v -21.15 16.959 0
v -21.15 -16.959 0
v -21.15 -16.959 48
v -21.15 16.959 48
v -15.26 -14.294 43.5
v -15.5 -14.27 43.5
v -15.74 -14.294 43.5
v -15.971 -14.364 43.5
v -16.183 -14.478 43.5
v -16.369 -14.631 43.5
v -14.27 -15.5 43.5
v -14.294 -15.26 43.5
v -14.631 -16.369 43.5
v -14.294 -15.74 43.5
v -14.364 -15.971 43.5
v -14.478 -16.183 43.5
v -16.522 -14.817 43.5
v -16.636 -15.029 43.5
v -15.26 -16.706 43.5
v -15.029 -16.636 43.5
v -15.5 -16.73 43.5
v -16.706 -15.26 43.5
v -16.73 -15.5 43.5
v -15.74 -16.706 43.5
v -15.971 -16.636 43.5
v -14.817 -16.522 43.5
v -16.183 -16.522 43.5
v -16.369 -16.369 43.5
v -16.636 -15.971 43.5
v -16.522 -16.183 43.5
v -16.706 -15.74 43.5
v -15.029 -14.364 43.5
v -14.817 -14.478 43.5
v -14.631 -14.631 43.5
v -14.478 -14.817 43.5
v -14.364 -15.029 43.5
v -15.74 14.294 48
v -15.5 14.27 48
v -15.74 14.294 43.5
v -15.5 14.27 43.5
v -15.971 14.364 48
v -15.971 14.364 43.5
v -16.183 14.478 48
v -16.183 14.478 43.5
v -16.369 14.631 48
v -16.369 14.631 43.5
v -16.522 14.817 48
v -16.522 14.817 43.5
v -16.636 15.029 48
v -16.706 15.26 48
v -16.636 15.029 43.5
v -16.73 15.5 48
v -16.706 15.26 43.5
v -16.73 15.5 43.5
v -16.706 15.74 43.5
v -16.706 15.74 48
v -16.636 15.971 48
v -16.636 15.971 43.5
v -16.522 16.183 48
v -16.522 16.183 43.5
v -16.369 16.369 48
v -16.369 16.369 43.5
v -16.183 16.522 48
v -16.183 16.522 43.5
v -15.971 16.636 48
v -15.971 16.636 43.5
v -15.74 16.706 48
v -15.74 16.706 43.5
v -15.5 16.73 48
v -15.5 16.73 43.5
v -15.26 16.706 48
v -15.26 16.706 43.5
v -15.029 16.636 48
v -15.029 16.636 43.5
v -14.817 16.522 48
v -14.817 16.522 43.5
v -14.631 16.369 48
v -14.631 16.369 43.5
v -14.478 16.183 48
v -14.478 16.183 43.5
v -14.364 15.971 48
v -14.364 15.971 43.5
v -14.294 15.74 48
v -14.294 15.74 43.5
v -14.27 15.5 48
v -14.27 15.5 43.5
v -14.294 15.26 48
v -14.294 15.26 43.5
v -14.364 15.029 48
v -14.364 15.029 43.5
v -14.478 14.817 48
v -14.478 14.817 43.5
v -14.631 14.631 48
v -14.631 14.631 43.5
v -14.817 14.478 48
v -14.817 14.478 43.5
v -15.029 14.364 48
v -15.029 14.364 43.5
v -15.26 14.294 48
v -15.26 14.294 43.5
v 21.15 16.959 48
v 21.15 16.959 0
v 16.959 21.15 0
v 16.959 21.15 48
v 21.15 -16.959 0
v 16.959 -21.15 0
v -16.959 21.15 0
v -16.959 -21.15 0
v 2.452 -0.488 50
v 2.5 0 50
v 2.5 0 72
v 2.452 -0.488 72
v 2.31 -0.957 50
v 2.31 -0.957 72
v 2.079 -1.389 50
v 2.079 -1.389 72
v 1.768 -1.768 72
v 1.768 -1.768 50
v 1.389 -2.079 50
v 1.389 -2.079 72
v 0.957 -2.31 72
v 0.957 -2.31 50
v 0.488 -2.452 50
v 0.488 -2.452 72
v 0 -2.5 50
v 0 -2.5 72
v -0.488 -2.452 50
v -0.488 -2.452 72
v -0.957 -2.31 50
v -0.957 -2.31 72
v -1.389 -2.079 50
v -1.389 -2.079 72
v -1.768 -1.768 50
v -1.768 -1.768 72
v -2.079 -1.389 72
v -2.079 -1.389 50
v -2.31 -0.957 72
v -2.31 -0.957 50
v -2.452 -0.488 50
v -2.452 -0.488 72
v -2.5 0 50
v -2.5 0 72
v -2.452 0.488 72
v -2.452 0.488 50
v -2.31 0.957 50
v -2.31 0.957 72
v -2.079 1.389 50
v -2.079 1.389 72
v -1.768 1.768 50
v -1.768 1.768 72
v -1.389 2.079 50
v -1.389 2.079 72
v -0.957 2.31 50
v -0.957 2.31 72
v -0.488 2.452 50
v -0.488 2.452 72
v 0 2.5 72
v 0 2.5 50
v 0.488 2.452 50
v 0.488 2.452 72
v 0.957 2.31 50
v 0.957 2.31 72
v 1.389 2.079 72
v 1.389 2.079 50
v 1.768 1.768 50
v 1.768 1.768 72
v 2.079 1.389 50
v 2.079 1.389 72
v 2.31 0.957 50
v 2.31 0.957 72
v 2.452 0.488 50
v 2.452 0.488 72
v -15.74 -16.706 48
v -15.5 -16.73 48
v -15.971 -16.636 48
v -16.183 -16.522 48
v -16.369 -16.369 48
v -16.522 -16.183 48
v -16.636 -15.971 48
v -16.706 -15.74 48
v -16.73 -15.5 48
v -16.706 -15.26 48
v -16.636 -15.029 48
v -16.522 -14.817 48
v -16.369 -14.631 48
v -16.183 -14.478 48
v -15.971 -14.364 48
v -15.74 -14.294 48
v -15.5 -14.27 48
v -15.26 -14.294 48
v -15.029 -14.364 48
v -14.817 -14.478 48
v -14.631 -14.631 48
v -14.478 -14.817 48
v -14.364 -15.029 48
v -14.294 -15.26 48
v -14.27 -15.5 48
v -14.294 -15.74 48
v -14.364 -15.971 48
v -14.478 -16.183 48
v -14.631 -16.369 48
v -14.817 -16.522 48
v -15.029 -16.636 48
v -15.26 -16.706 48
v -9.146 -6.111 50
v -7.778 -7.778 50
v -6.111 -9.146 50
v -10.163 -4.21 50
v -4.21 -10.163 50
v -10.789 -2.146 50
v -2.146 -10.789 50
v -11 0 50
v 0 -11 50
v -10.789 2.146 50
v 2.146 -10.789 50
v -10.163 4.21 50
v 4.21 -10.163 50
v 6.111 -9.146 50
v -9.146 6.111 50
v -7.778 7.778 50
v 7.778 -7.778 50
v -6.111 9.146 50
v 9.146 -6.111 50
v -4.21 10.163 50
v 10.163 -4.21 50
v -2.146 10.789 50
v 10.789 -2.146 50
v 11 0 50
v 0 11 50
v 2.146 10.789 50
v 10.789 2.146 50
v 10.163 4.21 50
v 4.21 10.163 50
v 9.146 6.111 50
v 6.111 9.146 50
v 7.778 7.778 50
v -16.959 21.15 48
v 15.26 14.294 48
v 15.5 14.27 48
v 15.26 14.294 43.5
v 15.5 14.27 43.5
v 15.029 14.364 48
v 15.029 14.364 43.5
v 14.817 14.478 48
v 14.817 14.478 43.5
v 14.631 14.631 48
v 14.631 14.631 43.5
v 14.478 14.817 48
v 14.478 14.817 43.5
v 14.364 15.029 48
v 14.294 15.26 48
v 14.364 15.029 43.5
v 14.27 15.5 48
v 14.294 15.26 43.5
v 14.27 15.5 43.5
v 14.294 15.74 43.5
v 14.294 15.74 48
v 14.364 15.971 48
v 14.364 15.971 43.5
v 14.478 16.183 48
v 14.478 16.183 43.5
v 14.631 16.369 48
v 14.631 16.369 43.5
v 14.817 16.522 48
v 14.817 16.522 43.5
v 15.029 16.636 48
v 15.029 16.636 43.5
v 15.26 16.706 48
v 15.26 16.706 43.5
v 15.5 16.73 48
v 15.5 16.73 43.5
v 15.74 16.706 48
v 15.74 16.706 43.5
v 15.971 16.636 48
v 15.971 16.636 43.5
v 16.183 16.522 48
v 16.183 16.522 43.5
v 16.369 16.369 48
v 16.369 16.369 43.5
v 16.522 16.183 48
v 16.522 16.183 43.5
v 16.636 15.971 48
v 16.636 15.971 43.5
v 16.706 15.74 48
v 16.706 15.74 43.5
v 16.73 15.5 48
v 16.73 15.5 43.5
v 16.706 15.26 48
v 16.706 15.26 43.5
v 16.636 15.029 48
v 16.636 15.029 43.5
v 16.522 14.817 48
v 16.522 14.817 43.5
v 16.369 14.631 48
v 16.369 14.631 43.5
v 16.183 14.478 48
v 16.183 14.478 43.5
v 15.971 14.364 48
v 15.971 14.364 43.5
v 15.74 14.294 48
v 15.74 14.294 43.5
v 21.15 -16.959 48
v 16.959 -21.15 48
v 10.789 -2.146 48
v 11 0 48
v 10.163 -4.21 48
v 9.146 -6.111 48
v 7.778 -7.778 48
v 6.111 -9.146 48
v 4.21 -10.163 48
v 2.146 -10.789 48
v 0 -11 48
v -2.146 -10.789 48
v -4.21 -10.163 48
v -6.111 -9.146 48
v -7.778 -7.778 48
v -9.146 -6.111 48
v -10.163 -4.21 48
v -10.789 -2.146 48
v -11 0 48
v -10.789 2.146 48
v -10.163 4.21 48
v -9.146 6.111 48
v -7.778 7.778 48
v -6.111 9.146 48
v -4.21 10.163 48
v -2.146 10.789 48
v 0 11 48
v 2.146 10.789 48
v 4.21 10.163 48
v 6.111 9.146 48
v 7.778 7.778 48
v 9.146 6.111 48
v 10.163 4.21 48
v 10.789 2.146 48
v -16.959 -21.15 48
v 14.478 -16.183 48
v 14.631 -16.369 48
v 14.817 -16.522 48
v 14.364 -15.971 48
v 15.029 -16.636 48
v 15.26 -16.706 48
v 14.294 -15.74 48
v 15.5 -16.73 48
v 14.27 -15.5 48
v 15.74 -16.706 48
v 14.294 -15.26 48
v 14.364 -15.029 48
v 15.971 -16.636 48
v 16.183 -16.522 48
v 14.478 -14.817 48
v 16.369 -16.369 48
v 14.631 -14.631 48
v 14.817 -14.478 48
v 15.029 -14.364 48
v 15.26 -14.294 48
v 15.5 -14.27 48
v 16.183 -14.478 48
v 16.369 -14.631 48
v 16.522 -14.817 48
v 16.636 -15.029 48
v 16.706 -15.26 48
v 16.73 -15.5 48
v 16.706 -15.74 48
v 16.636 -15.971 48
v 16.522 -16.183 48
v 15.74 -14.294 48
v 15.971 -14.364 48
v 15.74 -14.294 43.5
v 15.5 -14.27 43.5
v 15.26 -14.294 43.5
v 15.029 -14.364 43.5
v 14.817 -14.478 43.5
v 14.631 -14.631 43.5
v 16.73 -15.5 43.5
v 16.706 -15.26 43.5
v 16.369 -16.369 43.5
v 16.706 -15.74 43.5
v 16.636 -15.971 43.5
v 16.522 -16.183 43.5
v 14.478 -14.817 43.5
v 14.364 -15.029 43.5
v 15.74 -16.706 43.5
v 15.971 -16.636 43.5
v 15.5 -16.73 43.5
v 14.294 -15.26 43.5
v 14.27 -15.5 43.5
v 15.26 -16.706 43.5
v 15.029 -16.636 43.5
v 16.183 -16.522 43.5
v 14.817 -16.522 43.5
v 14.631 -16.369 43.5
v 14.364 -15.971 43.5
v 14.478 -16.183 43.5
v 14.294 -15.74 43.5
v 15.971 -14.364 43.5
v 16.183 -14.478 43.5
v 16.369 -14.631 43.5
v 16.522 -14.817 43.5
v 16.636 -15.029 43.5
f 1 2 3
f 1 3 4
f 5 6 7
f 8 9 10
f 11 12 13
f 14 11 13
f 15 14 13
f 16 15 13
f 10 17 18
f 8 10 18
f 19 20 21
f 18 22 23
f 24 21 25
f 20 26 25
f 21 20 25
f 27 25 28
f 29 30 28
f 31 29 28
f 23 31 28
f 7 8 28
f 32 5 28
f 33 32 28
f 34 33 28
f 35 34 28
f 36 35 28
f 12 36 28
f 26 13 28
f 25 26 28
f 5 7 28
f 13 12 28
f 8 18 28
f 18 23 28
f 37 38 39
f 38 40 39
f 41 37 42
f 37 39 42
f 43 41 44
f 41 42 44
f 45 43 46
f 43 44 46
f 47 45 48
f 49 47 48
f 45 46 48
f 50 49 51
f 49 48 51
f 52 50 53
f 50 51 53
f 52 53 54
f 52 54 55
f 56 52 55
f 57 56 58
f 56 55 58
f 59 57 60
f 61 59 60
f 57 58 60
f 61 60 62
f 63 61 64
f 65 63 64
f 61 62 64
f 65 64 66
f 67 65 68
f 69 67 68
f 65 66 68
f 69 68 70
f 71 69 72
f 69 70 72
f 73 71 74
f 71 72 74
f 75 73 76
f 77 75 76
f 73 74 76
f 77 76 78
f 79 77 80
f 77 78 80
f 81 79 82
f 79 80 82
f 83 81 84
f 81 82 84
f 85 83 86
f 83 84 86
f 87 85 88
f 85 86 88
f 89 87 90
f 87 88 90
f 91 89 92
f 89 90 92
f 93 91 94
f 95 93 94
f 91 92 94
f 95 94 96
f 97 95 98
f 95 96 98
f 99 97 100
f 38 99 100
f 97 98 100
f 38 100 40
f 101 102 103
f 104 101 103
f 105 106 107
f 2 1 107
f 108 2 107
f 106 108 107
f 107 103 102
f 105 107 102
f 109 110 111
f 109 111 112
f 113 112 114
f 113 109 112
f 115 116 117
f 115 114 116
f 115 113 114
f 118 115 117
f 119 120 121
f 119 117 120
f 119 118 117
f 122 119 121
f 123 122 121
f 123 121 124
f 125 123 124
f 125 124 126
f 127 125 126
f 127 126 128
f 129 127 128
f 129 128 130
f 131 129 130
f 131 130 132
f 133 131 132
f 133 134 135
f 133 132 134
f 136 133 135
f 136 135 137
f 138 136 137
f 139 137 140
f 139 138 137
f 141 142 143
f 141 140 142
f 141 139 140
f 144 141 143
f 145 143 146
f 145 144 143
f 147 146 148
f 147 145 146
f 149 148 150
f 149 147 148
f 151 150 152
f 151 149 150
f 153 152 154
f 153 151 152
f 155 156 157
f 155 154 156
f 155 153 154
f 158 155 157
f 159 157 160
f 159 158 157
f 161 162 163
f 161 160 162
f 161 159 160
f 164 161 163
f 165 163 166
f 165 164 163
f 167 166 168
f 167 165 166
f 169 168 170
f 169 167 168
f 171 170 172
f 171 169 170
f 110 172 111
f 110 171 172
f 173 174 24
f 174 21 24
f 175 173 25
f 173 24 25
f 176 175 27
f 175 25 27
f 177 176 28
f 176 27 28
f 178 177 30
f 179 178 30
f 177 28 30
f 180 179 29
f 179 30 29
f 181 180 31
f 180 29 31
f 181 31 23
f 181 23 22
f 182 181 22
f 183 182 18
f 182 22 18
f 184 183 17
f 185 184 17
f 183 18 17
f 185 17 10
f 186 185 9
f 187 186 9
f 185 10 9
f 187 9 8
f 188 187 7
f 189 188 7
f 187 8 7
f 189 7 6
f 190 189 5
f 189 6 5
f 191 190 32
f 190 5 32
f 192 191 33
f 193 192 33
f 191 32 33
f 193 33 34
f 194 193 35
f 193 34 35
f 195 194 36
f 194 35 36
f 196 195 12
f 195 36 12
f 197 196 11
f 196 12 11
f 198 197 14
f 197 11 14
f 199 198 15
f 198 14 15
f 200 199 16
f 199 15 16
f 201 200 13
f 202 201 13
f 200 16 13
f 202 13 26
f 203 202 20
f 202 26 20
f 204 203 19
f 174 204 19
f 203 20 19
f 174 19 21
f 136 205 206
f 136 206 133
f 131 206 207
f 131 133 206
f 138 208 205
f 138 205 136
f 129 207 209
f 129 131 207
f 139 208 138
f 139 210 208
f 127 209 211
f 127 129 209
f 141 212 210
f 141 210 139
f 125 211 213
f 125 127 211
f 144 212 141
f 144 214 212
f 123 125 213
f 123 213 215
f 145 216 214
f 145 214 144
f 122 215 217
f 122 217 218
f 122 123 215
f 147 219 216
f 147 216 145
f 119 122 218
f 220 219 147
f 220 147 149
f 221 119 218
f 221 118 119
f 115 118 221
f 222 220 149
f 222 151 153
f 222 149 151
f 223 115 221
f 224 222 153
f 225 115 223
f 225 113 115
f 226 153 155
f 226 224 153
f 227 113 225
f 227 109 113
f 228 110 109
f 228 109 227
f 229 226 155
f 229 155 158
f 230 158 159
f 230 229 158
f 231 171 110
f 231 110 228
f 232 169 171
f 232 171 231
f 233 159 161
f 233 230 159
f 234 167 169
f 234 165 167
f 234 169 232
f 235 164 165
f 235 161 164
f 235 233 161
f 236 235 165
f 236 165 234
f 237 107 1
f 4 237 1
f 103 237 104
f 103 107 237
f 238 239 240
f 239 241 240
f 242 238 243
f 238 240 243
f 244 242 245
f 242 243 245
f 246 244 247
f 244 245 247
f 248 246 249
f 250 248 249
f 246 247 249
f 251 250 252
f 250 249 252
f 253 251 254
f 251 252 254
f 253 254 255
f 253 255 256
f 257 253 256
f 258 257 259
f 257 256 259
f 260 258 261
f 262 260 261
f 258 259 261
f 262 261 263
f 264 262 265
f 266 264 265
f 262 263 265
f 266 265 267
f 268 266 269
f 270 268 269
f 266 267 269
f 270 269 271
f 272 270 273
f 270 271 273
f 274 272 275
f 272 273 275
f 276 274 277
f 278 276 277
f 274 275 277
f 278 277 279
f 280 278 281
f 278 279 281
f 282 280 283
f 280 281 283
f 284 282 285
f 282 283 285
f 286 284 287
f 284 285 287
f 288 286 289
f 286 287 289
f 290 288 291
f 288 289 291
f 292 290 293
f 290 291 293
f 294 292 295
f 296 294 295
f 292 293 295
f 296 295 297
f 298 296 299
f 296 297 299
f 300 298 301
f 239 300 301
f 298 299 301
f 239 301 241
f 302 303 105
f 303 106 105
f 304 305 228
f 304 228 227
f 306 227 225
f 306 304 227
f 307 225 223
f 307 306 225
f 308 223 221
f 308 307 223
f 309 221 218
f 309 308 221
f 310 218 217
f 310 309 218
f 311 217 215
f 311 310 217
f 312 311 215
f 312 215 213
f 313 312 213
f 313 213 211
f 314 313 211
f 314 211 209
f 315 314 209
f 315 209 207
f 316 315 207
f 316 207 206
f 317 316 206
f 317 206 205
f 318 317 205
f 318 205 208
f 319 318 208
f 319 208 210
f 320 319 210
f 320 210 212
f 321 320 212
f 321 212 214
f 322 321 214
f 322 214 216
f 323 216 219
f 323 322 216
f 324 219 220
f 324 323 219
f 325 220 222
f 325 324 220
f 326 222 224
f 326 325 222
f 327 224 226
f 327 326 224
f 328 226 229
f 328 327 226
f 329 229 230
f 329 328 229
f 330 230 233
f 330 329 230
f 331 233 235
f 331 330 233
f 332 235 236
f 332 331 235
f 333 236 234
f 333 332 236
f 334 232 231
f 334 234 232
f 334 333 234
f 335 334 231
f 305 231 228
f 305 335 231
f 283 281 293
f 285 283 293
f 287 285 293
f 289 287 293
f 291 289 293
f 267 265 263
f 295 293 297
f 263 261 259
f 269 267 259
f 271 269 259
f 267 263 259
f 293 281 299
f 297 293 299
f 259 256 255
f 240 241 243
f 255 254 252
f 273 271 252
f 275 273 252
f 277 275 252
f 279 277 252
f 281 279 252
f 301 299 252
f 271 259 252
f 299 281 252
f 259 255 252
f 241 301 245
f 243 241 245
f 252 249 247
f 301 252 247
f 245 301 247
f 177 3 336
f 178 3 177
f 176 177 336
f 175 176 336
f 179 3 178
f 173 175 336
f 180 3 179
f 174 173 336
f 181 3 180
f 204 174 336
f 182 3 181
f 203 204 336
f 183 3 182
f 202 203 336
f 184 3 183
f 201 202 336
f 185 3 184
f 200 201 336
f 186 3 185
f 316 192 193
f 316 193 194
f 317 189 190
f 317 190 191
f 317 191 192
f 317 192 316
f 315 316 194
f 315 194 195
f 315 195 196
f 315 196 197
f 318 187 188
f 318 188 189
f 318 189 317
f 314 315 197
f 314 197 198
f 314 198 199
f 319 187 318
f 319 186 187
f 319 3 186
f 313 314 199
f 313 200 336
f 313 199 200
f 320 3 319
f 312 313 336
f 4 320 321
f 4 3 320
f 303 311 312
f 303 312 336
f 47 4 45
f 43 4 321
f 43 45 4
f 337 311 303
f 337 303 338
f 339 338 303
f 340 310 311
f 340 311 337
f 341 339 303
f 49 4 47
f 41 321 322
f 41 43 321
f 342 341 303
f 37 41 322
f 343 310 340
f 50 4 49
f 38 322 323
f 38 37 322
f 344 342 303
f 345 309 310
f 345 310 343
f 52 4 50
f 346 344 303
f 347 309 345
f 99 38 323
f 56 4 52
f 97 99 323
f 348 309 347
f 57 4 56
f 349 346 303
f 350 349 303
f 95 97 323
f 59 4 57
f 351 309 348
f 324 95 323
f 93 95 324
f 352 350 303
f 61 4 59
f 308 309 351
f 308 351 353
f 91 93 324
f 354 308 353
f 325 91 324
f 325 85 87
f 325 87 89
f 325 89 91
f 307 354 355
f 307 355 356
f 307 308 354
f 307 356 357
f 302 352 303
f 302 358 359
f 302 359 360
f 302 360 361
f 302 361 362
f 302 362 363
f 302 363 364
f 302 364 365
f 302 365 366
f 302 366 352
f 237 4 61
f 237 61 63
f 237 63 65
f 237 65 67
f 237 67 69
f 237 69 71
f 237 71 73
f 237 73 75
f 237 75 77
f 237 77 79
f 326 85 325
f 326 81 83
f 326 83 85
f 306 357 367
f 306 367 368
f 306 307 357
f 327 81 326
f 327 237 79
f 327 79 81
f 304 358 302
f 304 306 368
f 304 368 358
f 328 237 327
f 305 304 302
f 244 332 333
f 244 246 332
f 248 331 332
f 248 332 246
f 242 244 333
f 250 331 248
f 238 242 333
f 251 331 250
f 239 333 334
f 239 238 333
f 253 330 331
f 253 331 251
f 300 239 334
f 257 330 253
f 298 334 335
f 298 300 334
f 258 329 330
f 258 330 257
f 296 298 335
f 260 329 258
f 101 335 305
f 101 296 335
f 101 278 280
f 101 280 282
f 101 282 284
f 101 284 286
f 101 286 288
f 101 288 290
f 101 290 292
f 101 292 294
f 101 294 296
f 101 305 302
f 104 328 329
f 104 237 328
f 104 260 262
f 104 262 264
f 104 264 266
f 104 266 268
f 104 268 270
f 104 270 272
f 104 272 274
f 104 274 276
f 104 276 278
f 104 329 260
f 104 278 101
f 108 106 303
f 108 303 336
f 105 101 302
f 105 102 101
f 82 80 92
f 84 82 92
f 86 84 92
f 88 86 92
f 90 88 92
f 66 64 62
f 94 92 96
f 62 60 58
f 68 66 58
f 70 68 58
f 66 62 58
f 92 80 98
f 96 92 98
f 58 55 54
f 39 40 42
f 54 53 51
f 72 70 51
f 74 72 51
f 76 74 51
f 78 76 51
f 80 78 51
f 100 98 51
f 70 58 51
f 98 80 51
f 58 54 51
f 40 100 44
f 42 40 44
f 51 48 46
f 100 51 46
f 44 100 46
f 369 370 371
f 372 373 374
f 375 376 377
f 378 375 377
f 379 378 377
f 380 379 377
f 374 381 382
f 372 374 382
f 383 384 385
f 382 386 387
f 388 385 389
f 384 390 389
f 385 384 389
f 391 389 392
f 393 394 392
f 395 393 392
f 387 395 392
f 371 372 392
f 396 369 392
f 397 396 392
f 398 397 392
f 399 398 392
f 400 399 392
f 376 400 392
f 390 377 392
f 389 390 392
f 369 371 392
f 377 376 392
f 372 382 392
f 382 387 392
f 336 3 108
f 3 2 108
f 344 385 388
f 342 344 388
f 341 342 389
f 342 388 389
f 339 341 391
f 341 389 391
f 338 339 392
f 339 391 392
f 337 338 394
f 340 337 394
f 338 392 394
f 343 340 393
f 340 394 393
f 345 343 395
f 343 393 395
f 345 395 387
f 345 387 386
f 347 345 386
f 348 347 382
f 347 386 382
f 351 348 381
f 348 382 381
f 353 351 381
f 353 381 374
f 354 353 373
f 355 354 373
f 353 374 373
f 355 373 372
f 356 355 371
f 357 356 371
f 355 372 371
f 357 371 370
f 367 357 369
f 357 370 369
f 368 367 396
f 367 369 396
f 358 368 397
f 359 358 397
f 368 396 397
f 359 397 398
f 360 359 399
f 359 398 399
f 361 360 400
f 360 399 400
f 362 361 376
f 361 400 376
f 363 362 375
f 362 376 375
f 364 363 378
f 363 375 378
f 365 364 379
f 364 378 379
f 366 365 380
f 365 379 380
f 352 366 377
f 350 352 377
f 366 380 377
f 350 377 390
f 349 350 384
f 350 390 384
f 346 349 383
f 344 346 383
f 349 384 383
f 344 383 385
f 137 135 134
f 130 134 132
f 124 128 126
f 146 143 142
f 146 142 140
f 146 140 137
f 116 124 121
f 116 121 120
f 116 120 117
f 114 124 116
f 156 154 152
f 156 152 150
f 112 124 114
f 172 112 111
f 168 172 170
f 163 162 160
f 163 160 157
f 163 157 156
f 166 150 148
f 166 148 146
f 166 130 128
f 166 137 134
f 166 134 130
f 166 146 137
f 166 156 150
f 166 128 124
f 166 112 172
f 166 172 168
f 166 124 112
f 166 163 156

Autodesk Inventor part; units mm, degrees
ref_plane "YZ Plane" through (0, 0, 0) normal (1, 0, 0) x (0, 1, 0)
ref_plane "XZ Plane" through (0, 0, 0) normal (0, 1, 0) x (-1, 0, 0)
ref_plane "XY Plane" through (0, 0, 0) normal (0, 0, 1) x (1, 0, 0)
sketch "スケッチ1" plane through (0, 0, 0) normal (0, 0, 1) x (1, 0, 0)
  line L0 (16.9587, -21.15) -> (-16.9587, -21.15)
  line L1 (-21.15, -16.9587) -> (-21.15, 16.9587)
  line L2 (-16.9587, 21.15) -> (16.9587, 21.15)
  line L3 (21.15, 16.9587) -> (21.15, -16.9587)
  line L4 (21.15, -21.15) -> (-21.15, 21.15) construction
  line L5 (-21.15, -21.15) -> (21.15, 21.15) construction
  line L6 (-16.9587, 21.15) -> (-21.15, 16.9587)
  line L7 (-21.15, -16.9587) -> (-16.9587, -21.15)
  line L8 (16.9587, -21.15) -> (21.15, -16.9587)
  line L9 (21.15, 16.9587) -> (16.9587, 21.15)
  point P0 (0, 0)
  dimension "d4" = 360
  dimension "d0" = 42.3
  dimension "d1" = 42.3
extrude "押し出し1" add sketch "スケッチ1" along normal blind 48
sketch "スケッチ2" plane through (0, 0, 48) normal (0, 0, 1) x (1, 0, 0)
  line L0 (15.5, -15.5) -> (-15.5, -15.5)
  line L1 (-15.5, -15.5) -> (-15.5, 15.5)
  line L2 (-15.5, 15.5) -> (15.5, 15.5)
  line L3 (15.5, 15.5) -> (15.5, -15.5)
  line L4 (15.5, -15.5) -> (-15.5, 15.5) construction
  line L5 (-15.5, -15.5) -> (15.5, 15.5) construction
  point P0 (0, 0)
  point P1 (15.5, 15.5)
  dimension "d8" = 31
  dimension "d9" = 31
hole "穴1" at (-15.5, 15.5, 48) at (15.5, 15.5, 48) at (15.5, -15.5, 48) at (-15.5, -15.5, 48) direction (0, 0, -1) diameter 2.459 depth 4.5 thread size "M3x0.5" class "6H" standard "ISO Metric profile"
sketch "スケッチ3" plane through (0, 0, 48) normal (0, 0, 1) x (1, 0, 0)
  circle A0 centre (0, 0) radius 11
  dimension "d17" = 22
extrude "押し出し2" add sketch "スケッチ3" along normal blind 2
sketch "スケッチ4" plane through (0, 0, 50) normal (0, 0, 1) x (1, 0, 0)
  circle A0 centre (0, 0) radius 2.5
  dimension "d20" = 5
extrude "押し出し3" add sketch "スケッチ4" along normal blind 22
properties part number "ステッピングモータ"
